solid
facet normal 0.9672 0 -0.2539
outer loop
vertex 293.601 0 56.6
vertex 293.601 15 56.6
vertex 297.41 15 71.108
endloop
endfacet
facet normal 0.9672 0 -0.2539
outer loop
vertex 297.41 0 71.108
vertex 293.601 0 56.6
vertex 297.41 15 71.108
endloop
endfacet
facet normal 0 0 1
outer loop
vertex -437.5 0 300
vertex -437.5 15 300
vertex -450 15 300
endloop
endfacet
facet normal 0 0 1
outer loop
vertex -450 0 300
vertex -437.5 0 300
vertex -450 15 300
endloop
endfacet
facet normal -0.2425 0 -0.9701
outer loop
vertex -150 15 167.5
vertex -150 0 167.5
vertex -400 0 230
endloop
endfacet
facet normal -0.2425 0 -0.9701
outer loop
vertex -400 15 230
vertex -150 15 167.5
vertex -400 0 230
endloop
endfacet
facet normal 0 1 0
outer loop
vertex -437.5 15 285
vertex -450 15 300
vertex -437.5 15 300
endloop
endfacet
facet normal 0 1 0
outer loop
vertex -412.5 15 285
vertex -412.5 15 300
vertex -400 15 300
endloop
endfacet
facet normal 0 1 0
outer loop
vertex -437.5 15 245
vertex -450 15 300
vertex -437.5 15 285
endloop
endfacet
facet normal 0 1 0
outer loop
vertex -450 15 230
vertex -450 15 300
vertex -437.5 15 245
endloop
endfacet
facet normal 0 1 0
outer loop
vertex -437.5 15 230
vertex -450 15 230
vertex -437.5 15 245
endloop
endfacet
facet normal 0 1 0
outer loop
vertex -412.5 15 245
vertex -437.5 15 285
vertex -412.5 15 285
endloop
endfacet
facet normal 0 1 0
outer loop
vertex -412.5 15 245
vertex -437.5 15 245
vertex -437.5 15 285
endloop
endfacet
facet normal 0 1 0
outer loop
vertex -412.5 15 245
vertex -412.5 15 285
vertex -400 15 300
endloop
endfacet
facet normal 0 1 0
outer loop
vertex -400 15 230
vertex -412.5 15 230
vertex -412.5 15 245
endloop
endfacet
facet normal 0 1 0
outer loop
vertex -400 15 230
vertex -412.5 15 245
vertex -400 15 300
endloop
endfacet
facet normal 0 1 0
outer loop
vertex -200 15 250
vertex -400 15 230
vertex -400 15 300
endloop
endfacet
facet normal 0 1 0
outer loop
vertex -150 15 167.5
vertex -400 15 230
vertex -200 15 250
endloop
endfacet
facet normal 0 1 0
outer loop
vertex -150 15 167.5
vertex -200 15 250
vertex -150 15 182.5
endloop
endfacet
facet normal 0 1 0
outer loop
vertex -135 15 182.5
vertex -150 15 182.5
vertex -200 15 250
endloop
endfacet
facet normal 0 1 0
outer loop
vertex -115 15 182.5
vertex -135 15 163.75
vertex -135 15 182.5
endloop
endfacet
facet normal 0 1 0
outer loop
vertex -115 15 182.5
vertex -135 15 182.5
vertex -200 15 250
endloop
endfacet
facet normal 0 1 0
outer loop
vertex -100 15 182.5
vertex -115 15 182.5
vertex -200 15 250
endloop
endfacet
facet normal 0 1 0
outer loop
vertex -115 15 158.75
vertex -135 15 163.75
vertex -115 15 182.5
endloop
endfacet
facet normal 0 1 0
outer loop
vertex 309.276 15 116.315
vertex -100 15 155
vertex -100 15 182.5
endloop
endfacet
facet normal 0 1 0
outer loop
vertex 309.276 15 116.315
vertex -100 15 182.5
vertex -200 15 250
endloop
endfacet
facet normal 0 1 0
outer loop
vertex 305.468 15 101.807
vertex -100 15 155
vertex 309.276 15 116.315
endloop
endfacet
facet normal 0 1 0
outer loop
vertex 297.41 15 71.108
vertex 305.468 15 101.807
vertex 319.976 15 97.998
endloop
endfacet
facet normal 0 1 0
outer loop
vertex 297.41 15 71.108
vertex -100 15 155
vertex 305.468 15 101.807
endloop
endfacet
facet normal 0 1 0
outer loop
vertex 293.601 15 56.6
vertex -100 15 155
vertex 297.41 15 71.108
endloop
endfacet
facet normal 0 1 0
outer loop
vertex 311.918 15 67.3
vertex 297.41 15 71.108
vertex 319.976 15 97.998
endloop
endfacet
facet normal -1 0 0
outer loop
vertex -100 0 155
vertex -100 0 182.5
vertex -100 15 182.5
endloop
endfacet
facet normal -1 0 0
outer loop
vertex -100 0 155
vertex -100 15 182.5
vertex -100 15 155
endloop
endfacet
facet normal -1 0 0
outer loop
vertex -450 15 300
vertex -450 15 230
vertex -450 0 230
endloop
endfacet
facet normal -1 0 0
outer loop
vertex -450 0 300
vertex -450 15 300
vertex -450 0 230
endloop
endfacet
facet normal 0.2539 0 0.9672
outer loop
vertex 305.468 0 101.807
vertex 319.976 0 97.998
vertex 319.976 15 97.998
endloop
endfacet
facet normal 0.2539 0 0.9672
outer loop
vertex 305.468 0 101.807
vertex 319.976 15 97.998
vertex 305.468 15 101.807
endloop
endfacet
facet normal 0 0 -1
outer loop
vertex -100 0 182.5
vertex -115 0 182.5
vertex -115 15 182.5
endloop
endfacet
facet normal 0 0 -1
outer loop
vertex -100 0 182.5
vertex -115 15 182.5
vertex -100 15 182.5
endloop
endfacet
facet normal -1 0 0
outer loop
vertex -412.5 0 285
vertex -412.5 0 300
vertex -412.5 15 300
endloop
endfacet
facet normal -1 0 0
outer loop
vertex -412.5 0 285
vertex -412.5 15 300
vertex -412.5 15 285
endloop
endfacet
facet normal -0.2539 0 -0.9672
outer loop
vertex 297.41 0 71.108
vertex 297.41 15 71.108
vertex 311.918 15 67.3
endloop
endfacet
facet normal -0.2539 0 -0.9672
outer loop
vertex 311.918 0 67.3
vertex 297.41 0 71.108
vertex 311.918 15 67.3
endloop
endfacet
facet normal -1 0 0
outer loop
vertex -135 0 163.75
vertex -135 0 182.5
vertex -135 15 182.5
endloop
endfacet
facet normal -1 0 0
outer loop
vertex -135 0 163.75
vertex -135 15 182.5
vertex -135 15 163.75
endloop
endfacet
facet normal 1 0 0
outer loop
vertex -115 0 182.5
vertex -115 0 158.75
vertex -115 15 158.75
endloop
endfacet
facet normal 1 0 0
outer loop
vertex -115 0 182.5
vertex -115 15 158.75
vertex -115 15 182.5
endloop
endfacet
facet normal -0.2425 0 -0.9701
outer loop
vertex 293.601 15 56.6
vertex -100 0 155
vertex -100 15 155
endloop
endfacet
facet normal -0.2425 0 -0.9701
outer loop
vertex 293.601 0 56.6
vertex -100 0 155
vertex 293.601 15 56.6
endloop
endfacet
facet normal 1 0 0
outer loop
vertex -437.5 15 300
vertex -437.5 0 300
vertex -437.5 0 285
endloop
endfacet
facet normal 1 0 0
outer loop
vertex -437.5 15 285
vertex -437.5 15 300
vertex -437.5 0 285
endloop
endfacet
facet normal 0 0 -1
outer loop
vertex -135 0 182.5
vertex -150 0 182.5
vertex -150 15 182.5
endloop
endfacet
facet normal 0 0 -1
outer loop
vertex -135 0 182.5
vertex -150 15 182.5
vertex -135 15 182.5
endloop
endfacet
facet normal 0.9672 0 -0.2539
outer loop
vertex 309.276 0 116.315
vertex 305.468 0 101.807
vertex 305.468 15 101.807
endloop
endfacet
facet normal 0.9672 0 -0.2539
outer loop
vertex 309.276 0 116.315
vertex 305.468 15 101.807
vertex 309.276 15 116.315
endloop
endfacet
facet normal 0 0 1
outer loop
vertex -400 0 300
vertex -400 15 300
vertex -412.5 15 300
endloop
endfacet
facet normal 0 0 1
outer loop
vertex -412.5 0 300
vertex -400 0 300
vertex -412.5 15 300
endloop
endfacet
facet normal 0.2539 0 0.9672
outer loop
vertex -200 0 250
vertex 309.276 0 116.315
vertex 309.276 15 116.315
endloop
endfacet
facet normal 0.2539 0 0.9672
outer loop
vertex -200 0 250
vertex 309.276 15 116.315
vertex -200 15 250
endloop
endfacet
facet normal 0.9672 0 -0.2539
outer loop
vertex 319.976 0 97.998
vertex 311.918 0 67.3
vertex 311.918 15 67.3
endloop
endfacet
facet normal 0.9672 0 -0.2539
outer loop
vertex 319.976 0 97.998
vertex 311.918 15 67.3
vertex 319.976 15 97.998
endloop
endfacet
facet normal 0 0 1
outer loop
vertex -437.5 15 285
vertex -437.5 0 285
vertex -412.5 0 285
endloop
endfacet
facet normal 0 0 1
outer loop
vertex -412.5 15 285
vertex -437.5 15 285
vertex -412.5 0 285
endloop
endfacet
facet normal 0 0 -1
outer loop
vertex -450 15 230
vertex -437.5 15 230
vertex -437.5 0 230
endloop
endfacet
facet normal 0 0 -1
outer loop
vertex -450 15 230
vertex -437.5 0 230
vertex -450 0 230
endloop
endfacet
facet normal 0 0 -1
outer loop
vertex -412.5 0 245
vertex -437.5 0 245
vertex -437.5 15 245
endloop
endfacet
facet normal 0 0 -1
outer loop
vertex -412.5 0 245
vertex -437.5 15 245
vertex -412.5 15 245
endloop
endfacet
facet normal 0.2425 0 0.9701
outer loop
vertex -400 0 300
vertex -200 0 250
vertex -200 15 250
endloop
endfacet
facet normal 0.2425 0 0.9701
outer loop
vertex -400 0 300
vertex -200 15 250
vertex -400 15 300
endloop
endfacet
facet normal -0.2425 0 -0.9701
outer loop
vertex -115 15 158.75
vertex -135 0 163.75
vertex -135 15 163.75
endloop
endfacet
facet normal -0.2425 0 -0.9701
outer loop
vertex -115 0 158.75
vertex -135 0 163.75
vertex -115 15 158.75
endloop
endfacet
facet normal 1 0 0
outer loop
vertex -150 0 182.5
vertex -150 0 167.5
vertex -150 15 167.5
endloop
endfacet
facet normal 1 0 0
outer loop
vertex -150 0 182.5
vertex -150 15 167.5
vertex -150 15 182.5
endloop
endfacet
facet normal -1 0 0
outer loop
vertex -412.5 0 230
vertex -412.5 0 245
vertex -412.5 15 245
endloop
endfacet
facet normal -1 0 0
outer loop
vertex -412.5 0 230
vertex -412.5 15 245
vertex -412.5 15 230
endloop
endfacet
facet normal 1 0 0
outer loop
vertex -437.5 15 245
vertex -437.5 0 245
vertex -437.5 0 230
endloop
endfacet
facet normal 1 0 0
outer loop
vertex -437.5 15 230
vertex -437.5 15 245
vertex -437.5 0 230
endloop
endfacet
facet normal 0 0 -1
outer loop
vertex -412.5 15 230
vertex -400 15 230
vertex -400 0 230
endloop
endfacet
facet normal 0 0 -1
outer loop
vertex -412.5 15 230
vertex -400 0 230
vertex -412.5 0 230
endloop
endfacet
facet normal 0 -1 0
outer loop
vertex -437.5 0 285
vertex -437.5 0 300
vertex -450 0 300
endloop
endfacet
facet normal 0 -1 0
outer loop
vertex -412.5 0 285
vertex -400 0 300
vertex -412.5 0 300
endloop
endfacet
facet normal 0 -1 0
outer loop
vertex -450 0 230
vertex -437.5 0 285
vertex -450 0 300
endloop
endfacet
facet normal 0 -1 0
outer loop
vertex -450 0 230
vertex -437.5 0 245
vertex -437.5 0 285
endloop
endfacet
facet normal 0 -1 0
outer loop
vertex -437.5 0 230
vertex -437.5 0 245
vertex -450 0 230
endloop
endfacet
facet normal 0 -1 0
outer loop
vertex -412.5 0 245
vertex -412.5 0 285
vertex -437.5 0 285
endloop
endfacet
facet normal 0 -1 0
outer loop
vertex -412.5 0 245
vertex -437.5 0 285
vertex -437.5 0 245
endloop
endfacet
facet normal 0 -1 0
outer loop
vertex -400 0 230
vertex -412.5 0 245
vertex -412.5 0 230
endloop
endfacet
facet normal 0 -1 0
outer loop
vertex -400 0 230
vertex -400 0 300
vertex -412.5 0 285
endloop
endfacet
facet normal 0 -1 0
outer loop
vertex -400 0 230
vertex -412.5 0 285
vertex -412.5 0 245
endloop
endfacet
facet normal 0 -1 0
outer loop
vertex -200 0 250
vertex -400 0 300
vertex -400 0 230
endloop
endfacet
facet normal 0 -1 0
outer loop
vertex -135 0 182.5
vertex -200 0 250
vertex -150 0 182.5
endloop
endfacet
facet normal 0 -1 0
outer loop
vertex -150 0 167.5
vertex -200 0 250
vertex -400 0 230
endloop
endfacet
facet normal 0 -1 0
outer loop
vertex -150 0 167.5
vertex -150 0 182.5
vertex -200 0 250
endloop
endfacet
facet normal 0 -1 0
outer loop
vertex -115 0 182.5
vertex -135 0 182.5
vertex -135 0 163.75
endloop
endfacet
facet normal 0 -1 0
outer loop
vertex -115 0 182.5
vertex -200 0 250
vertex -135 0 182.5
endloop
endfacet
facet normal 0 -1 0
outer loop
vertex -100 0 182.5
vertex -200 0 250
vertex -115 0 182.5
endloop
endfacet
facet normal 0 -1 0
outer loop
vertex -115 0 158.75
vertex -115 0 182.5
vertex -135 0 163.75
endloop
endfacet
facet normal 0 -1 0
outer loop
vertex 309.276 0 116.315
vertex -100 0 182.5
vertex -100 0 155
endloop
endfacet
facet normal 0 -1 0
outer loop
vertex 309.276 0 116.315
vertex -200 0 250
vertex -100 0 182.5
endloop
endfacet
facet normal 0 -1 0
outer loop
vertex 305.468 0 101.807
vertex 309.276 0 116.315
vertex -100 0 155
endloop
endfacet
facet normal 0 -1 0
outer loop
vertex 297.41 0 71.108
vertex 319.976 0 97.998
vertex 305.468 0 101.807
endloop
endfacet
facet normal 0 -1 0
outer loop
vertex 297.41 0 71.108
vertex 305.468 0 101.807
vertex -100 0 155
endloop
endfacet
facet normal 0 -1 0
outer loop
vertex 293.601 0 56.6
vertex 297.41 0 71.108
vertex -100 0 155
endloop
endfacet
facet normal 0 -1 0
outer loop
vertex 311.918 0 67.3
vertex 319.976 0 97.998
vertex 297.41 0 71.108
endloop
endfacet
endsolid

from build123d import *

# Parameters (mm, degrees)
BOSS_EXTRUDE1_DEPTH             = 15
BOSS_EXTRUDE2_REACH             = 1239.023
BOSS_EXTRUDE2_DIRECTION_2_REACH = 1239.023
CUT_EXTRUDE2_DEPTH              = 1238.578280352
CUT_EXTRUDE2_DEPTH_BACK         = 1238.578280352
SKETCH5_W                       = 40
SKETCH5_H                       = 40
CUT_EXTRUDE3_DEPTH              = 1238.578280352
BOSS_EXTRUDE4_DEPTH             = 75
CUT_EXTRUDE4_DEPTH              = 1241.107934819
CUT_EXTRUDE4_DEPTH_BACK         = 1241.107934819
SKETCH8_W                       = 15
SKETCH8_H                       = 73.7
FILLET1_R                       = 5
CUT_EXTRUDE5_DEPTH              = 1241.107934819
CUT_EXTRUDE5_DEPTH_BACK         = 1241.107934819
SKETCH9_W                       = 25
SKETCH9_H                       = 15
SKETCH9_W_2                     = 15
CUT_EXTRUDE6_DEPTH              = 1241.107934819
CUT_EXTRUDE6_DEPTH_BACK         = 1241.107934819
SKETCH10_W                      = 1728.920732784
SKETCH10_H                      = 178.853868908
SKETCH10_W_2                    = 1650
SKETCH10_H_2                    = 15
CUT_EXTRUDE9_DEPTH              = 1238.022635201
CUT_EXTRUDE9_DEPTH_BACK         = 1238.022635201
SKETCH11_W                      = 1852.680615207
SKETCH11_H                      = 1075.927112831


with BuildPart() as part:
    # Sketch1 → Boss-Extrude1 (new body)
    with BuildSketch(Plane(origin=(0, 0, 0), x_dir=(1, 0, 0), z_dir=(0, 1, 0))):
        Polygon((-450, 300), (-400, 300), (-200, 250), (600, 40), (1200, 40), (1200, -40), (600, -40), (-200, -250), (-400, -300), (-450, -300), align=None)
    extrude(amount=BOSS_EXTRUDE1_DEPTH)

    # Boss-Extrude2: up to this face of the body (flat: up to its plane)
    boss_extrude2_end = Plane(part.part.faces().sort_by_distance((-425, 7.5, 300))[0])
    # Sketch2 → Boss-Extrude2 (add, up to the picked face)
    with BuildSketch(Plane.XY, mode=Mode.PRIVATE) as boss_extrude2_sk1:
        with BuildLine():
            Line((-425, 0), (-450, 0))
            Line((-450, 0), (-450, -40))
            Line((-450, -40), (-440, -40))
            Line((-440, -40), (-440, -15))
            ThreePointArc((-440, -15), (-435.606601718, -4.393398282), (-425, 0))
        make_face()
    boss_extrude2_tool1 = split(extrude(boss_extrude2_sk1.sketch, amount=BOSS_EXTRUDE2_REACH, mode=Mode.PRIVATE), bisect_by=boss_extrude2_end, keep=Keep.BOTH, mode=Mode.PRIVATE)
    # Sketch2 → Boss-Extrude2 (add, up to the picked face)
    with BuildSketch(Plane.XY, mode=Mode.PRIVATE) as boss_extrude2_sk2:
        with BuildLine():
            Line((-400, 0), (-425, 0))
            ThreePointArc((-425, 0), (-414.393398282, -4.393398282), (-410, -15))
            Line((-410, -15), (-410, -40))
            Line((-410, -40), (-400, -40))
            Line((-400, -40), (-400, 0))
        make_face()
    boss_extrude2_tool2 = split(extrude(boss_extrude2_sk2.sketch, amount=BOSS_EXTRUDE2_REACH, mode=Mode.PRIVATE), bisect_by=boss_extrude2_end, keep=Keep.BOTH, mode=Mode.PRIVATE)
    add(boss_extrude2_tool1.solids().sort_by(Axis((-444.100555, -18.206662, 0), (0, 0, 1)))[0])
    add(boss_extrude2_tool2.solids().sort_by(Axis((-405.899445, -18.206662, 0), (0, 0, 1)))[0])

    # Boss-Extrude2 direction 2: up to this face of the body (flat: up to its plane)
    boss_extrude2_direction_2_end = Plane(part.part.faces().sort_by_distance((-425, 7.5, -300))[0])
    # Sketch2 → Boss-Extrude2 direction 2 (add, up to the picked face)
    with BuildSketch(Plane.XY, mode=Mode.PRIVATE) as boss_extrude2_direction_2_sk1:
        with BuildLine():
            Line((-425, 0), (-450, 0))
            Line((-450, 0), (-450, -40))
            Line((-450, -40), (-440, -40))
            Line((-440, -40), (-440, -15))
            ThreePointArc((-440, -15), (-435.606601718, -4.393398282), (-425, 0))
        make_face()
    boss_extrude2_direction_2_tool1 = split(extrude(boss_extrude2_direction_2_sk1.sketch, amount=-BOSS_EXTRUDE2_DIRECTION_2_REACH, mode=Mode.PRIVATE), bisect_by=boss_extrude2_direction_2_end, keep=Keep.BOTH, mode=Mode.PRIVATE)
    # Sketch2 → Boss-Extrude2 direction 2 (add, up to the picked face)
    with BuildSketch(Plane.XY, mode=Mode.PRIVATE) as boss_extrude2_direction_2_sk2:
        with BuildLine():
            Line((-400, 0), (-425, 0))
            ThreePointArc((-425, 0), (-414.393398282, -4.393398282), (-410, -15))
            Line((-410, -15), (-410, -40))
            Line((-410, -40), (-400, -40))
            Line((-400, -40), (-400, 0))
        make_face()
    boss_extrude2_direction_2_tool2 = split(extrude(boss_extrude2_direction_2_sk2.sketch, amount=-BOSS_EXTRUDE2_DIRECTION_2_REACH, mode=Mode.PRIVATE), bisect_by=boss_extrude2_direction_2_end, keep=Keep.BOTH, mode=Mode.PRIVATE)
    add(boss_extrude2_direction_2_tool1.solids().sort_by(Axis((-444.100555, -18.206662, 0), (0, 0, -1)))[0])
    add(boss_extrude2_direction_2_tool2.solids().sort_by(Axis((-405.899445, -18.206662, 0), (0, 0, -1)))[0])

    # Sketch4 → Cut-Extrude2 (cut, two sides: drawn at the far end of the back side and taken through both)
    with BuildSketch(Plane(origin=(0, 0, 0), x_dir=(1, 0, 0), z_dir=(0, 1, 0)).offset(-CUT_EXTRUDE2_DEPTH_BACK)):
        Polygon((-450, 230), (-400, 230), (-150, 167.5), (-150, -167.5), (-400, -230), (-450, -230), align=None)
        Polygon((-100, 155), (-100, -155), (520, 0), align=None)
    extrude(amount=CUT_EXTRUDE2_DEPTH + CUT_EXTRUDE2_DEPTH_BACK, mode=Mode.SUBTRACT)

    # Sketch5 → Cut-Extrude3 (cut, through all)
    with BuildSketch(Plane(origin=(0, 0, 0), x_dir=(0, 0, -1), z_dir=(1, 0, 0))):
        with Locations((-265, -20)):
            Rectangle(SKETCH5_W, SKETCH5_H)
        with Locations((265, -20)):
            Rectangle(SKETCH5_W, SKETCH5_H)
    extrude(amount=-CUT_EXTRUDE3_DEPTH, mode=Mode.SUBTRACT)

    # Sketch7 → Boss-Extrude4 (add)
    with BuildSketch(Plane(origin=(1200, 0, 0), x_dir=(0, 0, -1), z_dir=(1, 0, 0))):
        with BuildLine():
            Line((-87.5, 50), (-40, 15))
            Line((-40, 15), (40, 15))
            Line((40, 15), (87.5, 50))
            Line((87.5, 50), (87.5, 88.7))
            Line((87.5, 88.7), (58.5, 88.7))
            Line((58.5, 88.7), (58.5, 63.2))
            Line((58.5, 63.2), (48.5, 63.2))
            Line((48.5, 63.2), (48.5, 88.7))
            Line((48.5, 88.7), (20, 88.7))
            Line((20, 88.7), (20, 50))
            ThreePointArc((20, 50), (0, 30), (-20, 50))
            Line((-20, 50), (-20, 88.7))
            Line((-20, 88.7), (-63, 88.7))
            Line((-63, 88.7), (-63, 63.2))
            Line((-63, 63.2), (-73, 63.2))
            Line((-73, 63.2), (-73, 88.7))
            Line((-73, 88.7), (-87.5, 88.7))
            Line((-87.5, 88.7), (-87.5, 50))
        make_face()
    extrude(amount=-BOSS_EXTRUDE4_DEPTH)

    # Sketch8 → Cut-Extrude4 (cut, two sides: drawn at the far end of the back side and taken through both)
    with BuildSketch(Plane.XY.offset(-CUT_EXTRUDE4_DEPTH_BACK)):
        with Locations((1147.5, 51.85)):
            Rectangle(SKETCH8_W, SKETCH8_H)
        with Locations((1177.5, 51.85)):
            Rectangle(SKETCH8_W, SKETCH8_H)
    extrude(amount=CUT_EXTRUDE4_DEPTH + CUT_EXTRUDE4_DEPTH_BACK, mode=Mode.SUBTRACT)

    # Fillet1
    fillet1_edges = [part.edges().sort_by_distance(p)[0] for p in [
        (1192.5, 50, 87.5),
        (1162.5, 50, 87.5),
        (1132.5, 50, 87.5),
        (1192.5, 50, -87.5),
        (1162.5, 50, -87.5),
        (1132.5, 50, -87.5),
        (1192.5, 88.7, -87.5),
        (1162.5, 88.7, -87.5),
        (1132.5, 88.7, -87.5),
        (1132.5, 88.7, -58.5),
        (1162.5, 88.7, -58.5),
        (1192.5, 88.7, -58.5),
        (1192.5, 88.7, -48.5),
        (1162.5, 88.7, -48.5),
        (1132.5, 88.7, -48.5),
        (1192.5, 88.7, -20),
        (1162.5, 88.7, -20),
        (1132.5, 88.7, -20),
        (1192.5, 88.7, 63),
        (1162.5, 88.7, 63),
        (1132.5, 88.7, 63),
        (1132.5, 88.7, 87.5),
        (1162.5, 88.7, 87.5),
        (1192.5, 88.7, 87.5),
        (1192.5, 88.7, 73),
        (1162.5, 88.7, 73),
        (1132.5, 88.7, 73),
        (1192.5, 88.7, 20),
        (1162.5, 88.7, 20),
        (1132.5, 88.7, 20),
        (600, 7.5, 40),
        (600, 7.5, -40),
        (520, 7.5, 0),
        (-440, -40, -292.5),
        (-440, -40, -237.5),
        (-400, -40, -292.5),
        (-400, -40, -237.5),
        (-450, -40, -237.5),
        (-410, -40, -237.5),
        (-450, -40, -292.5),
        (-410, -40, -292.5),
        (-150, 7.5, 167.5),
        (-100, 7.5, 155),
        (-150, 7.5, -167.5),
        (-100, 7.5, -155),
        (-450, -40, 237.5),
        (-410, -40, 237.5),
        (-440, -40, 237.5),
        (-400, -40, 237.5),
        (-450, -40, 292.5),
        (-440, -40, 292.5),
        (-400, -40, 292.5),
        (-410, -40, 292.5),
    ]]
    fillet(fillet1_edges, radius=FILLET1_R - 0.0001)  # a hair under: the kernel refuses the full size

    # Sketch9 → Cut-Extrude5 (cut, two sides: drawn at the far end of the back side and taken through both)
    with BuildSketch(Plane(origin=(0, 0, 0), x_dir=(1, 0, 0), z_dir=(0, 1, 0)).offset(-CUT_EXTRUDE5_DEPTH_BACK)):
        with Locations((-425, -292.5)):
            Rectangle(SKETCH9_W, SKETCH9_H)
        with Locations((1192.5, -32.5)):
            Rectangle(SKETCH9_W_2, SKETCH9_H)
        with Locations((1192.5, 32.5)):
            Rectangle(SKETCH9_W_2, SKETCH9_H)
        with Locations((1162.5, 32.5)):
            Rectangle(SKETCH9_W_2, SKETCH9_H)
        with Locations((1132.5, 32.5)):
            Rectangle(SKETCH9_W_2, SKETCH9_H)
        with Locations((1132.5, -32.5)):
            Rectangle(SKETCH9_W_2, SKETCH9_H)
        with Locations((1162.5, -32.5)):
            Rectangle(SKETCH9_W_2, SKETCH9_H)
        with Locations((-425, -237.5)):
            Rectangle(SKETCH9_W, SKETCH9_H)
        with Locations((-425, 237.5)):
            Rectangle(SKETCH9_W, SKETCH9_H)
        with Locations((-425, 292.5)):
            Rectangle(SKETCH9_W, SKETCH9_H)
    extrude(amount=CUT_EXTRUDE5_DEPTH + CUT_EXTRUDE5_DEPTH_BACK, mode=Mode.SUBTRACT)


with BuildPart() as cut_extrude5_piece_1:
    # of the separate pieces the step leaves, piece 1, a body of its own (cut_extrude5_pieces)
    add(part.part.solids().sort_by_distance((-400, -35.0001, -300))[0])


with BuildPart() as cut_extrude5_piece_2:
    # of the separate pieces the step leaves, piece 2, a body of its own (cut_extrude5_pieces)
    add(part.part.solids().sort_by_distance((1170, 48.501289589, 85.46603587))[0])


with BuildPart() as cut_extrude5_piece_3:
    # of the separate pieces the step leaves, piece 3, a body of its own (cut_extrude5_pieces)
    add(part.part.solids().sort_by_distance((1170, 48.501289589, -85.46603587))[0])


with BuildPart() as cut_extrude5_piece_4:
    # of the separate pieces the step leaves, piece 4, a body of its own (cut_extrude5_pieces)
    add(part.part.solids().sort_by_distance((1125, 83.7001, 73))[0])


with BuildPart() as cut_extrude5_piece_5:
    # of the separate pieces the step leaves, piece 5, a body of its own (cut_extrude5_pieces)
    add(part.part.solids().sort_by_distance((1200, 48.501289589, 85.46603587))[0])


with BuildPart() as cut_extrude5_piece_6:
    # of the separate pieces the step leaves, piece 6, a body of its own (cut_extrude5_pieces)
    add(part.part.solids().sort_by_distance((1200, 48.501289589, -85.46603587))[0])


with BuildPart() as cut_extrude5_piece_7:
    # of the separate pieces the step leaves, piece 7, a body of its own (cut_extrude5_pieces)
    add(part.part.solids().sort_by_distance((1125, 88.7, -40))[0])


with BuildPart() as cut_extrude6_tool:
    # Sketch10 → Cut-Extrude6 (new, two sides: drawn at the far end of the back side and taken through both)
    with BuildSketch(Plane.XY.offset(-CUT_EXTRUDE6_DEPTH_BACK)):
        with Locations((378.379601058, 20.599691165)):
            Rectangle(SKETCH10_W, SKETCH10_H)
        with Locations((375, 7.5)):
            Rectangle(SKETCH10_W_2, SKETCH10_H_2, mode=Mode.SUBTRACT)
    extrude(amount=CUT_EXTRUDE6_DEPTH + CUT_EXTRUDE6_DEPTH_BACK)


with BuildPart() as cut_extrude5_piece_1_1:
    add(cut_extrude5_piece_1.part)

    # Cut-Extrude6: cut by cut_extrude6_tool
    add(cut_extrude6_tool.part, mode=Mode.SUBTRACT)

    # Sketch11 → Cut-Extrude9 (cut, two sides: drawn at the far end of the back side and taken through both)
    # profile 1 of 5: a face of its own
    with BuildSketch(Plane(origin=(0, 0, 0), x_dir=(1, 0, 0), z_dir=(0, 1, 0)).offset(-CUT_EXTRUDE9_DEPTH_BACK)):
        with Locations((324.970767393, -26.108881651)):
            Rectangle(SKETCH11_W, SKETCH11_H)
        Polygon((309.276307823, -116.314969197), (-450, -315.625), (-450, -242.5), (-450, -230), (-400, -230), (-150, -167.5), (-135, -163.75), (-115, -158.75), (-100, -155), (293.601058917, -56.599735271), (308.154197556, -52.961450611), (311.917995324, -67.299727825), (319.976300377, -97.99803279), (323.784772304, -112.50649727), align=None, mode=Mode.SUBTRACT)
    # profile 2 of 5: a face of its own
    with BuildSketch(Plane(origin=(0, 0, 0), x_dir=(1, 0, 0), z_dir=(0, 1, 0)).offset(-CUT_EXTRUDE9_DEPTH_BACK)):
        Polygon((-135, -163.75), (-150, -167.5), (-150, -182.5), (-135, -182.5), align=None)
    # profile 3 of 5: a face of its own
    with BuildSketch(Plane(origin=(0, 0, 0), x_dir=(1, 0, 0), z_dir=(0, 1, 0)).offset(-CUT_EXTRUDE9_DEPTH_BACK)):
        Polygon((-100, -155), (-115, -158.75), (-115, -182.5), (-100, -182.5), align=None)
    # profile 4 of 5: a face of its own
    with BuildSketch(Plane(origin=(0, 0, 0), x_dir=(1, 0, 0), z_dir=(0, 1, 0)).offset(-CUT_EXTRUDE9_DEPTH_BACK)):
        Polygon((305.467835897, -101.806504716), (309.276307823, -116.314969197), (323.784772304, -112.50649727), (319.976300377, -97.99803279), align=None)
    # profile 5 of 5: a face of its own
    with BuildSketch(Plane(origin=(0, 0, 0), x_dir=(1, 0, 0), z_dir=(0, 1, 0)).offset(-CUT_EXTRUDE9_DEPTH_BACK)):
        Polygon((297.409530844, -71.108199751), (311.917995324, -67.299727825), (308.154197556, -52.961450611), (293.601058917, -56.599735271), align=None)
    extrude(amount=CUT_EXTRUDE9_DEPTH + CUT_EXTRUDE9_DEPTH_BACK, mode=Mode.SUBTRACT)


with BuildPart() as cut_extrude5_piece_2_1:
    add(cut_extrude5_piece_2.part)

    # Cut-Extrude6: cut by cut_extrude6_tool
    add(cut_extrude6_tool.part, mode=Mode.SUBTRACT)


with BuildPart() as cut_extrude5_piece_3_1:
    add(cut_extrude5_piece_3.part)

    # Cut-Extrude6: cut by cut_extrude6_tool
    add(cut_extrude6_tool.part, mode=Mode.SUBTRACT)


with BuildPart() as cut_extrude5_piece_4_1:
    add(cut_extrude5_piece_4.part)

    # Cut-Extrude6: cut by cut_extrude6_tool
    add(cut_extrude6_tool.part, mode=Mode.SUBTRACT)


with BuildPart() as cut_extrude5_piece_5_1:
    add(cut_extrude5_piece_5.part)

    # Cut-Extrude6: cut by cut_extrude6_tool
    add(cut_extrude6_tool.part, mode=Mode.SUBTRACT)


with BuildPart() as cut_extrude5_piece_6_1:
    add(cut_extrude5_piece_6.part)

    # Cut-Extrude6: cut by cut_extrude6_tool
    add(cut_extrude6_tool.part, mode=Mode.SUBTRACT)


with BuildPart() as cut_extrude5_piece_7_1:
    add(cut_extrude5_piece_7.part)

    # Cut-Extrude6: cut by cut_extrude6_tool
    add(cut_extrude6_tool.part, mode=Mode.SUBTRACT)


solid = cut_extrude5_piece_1_1.part
